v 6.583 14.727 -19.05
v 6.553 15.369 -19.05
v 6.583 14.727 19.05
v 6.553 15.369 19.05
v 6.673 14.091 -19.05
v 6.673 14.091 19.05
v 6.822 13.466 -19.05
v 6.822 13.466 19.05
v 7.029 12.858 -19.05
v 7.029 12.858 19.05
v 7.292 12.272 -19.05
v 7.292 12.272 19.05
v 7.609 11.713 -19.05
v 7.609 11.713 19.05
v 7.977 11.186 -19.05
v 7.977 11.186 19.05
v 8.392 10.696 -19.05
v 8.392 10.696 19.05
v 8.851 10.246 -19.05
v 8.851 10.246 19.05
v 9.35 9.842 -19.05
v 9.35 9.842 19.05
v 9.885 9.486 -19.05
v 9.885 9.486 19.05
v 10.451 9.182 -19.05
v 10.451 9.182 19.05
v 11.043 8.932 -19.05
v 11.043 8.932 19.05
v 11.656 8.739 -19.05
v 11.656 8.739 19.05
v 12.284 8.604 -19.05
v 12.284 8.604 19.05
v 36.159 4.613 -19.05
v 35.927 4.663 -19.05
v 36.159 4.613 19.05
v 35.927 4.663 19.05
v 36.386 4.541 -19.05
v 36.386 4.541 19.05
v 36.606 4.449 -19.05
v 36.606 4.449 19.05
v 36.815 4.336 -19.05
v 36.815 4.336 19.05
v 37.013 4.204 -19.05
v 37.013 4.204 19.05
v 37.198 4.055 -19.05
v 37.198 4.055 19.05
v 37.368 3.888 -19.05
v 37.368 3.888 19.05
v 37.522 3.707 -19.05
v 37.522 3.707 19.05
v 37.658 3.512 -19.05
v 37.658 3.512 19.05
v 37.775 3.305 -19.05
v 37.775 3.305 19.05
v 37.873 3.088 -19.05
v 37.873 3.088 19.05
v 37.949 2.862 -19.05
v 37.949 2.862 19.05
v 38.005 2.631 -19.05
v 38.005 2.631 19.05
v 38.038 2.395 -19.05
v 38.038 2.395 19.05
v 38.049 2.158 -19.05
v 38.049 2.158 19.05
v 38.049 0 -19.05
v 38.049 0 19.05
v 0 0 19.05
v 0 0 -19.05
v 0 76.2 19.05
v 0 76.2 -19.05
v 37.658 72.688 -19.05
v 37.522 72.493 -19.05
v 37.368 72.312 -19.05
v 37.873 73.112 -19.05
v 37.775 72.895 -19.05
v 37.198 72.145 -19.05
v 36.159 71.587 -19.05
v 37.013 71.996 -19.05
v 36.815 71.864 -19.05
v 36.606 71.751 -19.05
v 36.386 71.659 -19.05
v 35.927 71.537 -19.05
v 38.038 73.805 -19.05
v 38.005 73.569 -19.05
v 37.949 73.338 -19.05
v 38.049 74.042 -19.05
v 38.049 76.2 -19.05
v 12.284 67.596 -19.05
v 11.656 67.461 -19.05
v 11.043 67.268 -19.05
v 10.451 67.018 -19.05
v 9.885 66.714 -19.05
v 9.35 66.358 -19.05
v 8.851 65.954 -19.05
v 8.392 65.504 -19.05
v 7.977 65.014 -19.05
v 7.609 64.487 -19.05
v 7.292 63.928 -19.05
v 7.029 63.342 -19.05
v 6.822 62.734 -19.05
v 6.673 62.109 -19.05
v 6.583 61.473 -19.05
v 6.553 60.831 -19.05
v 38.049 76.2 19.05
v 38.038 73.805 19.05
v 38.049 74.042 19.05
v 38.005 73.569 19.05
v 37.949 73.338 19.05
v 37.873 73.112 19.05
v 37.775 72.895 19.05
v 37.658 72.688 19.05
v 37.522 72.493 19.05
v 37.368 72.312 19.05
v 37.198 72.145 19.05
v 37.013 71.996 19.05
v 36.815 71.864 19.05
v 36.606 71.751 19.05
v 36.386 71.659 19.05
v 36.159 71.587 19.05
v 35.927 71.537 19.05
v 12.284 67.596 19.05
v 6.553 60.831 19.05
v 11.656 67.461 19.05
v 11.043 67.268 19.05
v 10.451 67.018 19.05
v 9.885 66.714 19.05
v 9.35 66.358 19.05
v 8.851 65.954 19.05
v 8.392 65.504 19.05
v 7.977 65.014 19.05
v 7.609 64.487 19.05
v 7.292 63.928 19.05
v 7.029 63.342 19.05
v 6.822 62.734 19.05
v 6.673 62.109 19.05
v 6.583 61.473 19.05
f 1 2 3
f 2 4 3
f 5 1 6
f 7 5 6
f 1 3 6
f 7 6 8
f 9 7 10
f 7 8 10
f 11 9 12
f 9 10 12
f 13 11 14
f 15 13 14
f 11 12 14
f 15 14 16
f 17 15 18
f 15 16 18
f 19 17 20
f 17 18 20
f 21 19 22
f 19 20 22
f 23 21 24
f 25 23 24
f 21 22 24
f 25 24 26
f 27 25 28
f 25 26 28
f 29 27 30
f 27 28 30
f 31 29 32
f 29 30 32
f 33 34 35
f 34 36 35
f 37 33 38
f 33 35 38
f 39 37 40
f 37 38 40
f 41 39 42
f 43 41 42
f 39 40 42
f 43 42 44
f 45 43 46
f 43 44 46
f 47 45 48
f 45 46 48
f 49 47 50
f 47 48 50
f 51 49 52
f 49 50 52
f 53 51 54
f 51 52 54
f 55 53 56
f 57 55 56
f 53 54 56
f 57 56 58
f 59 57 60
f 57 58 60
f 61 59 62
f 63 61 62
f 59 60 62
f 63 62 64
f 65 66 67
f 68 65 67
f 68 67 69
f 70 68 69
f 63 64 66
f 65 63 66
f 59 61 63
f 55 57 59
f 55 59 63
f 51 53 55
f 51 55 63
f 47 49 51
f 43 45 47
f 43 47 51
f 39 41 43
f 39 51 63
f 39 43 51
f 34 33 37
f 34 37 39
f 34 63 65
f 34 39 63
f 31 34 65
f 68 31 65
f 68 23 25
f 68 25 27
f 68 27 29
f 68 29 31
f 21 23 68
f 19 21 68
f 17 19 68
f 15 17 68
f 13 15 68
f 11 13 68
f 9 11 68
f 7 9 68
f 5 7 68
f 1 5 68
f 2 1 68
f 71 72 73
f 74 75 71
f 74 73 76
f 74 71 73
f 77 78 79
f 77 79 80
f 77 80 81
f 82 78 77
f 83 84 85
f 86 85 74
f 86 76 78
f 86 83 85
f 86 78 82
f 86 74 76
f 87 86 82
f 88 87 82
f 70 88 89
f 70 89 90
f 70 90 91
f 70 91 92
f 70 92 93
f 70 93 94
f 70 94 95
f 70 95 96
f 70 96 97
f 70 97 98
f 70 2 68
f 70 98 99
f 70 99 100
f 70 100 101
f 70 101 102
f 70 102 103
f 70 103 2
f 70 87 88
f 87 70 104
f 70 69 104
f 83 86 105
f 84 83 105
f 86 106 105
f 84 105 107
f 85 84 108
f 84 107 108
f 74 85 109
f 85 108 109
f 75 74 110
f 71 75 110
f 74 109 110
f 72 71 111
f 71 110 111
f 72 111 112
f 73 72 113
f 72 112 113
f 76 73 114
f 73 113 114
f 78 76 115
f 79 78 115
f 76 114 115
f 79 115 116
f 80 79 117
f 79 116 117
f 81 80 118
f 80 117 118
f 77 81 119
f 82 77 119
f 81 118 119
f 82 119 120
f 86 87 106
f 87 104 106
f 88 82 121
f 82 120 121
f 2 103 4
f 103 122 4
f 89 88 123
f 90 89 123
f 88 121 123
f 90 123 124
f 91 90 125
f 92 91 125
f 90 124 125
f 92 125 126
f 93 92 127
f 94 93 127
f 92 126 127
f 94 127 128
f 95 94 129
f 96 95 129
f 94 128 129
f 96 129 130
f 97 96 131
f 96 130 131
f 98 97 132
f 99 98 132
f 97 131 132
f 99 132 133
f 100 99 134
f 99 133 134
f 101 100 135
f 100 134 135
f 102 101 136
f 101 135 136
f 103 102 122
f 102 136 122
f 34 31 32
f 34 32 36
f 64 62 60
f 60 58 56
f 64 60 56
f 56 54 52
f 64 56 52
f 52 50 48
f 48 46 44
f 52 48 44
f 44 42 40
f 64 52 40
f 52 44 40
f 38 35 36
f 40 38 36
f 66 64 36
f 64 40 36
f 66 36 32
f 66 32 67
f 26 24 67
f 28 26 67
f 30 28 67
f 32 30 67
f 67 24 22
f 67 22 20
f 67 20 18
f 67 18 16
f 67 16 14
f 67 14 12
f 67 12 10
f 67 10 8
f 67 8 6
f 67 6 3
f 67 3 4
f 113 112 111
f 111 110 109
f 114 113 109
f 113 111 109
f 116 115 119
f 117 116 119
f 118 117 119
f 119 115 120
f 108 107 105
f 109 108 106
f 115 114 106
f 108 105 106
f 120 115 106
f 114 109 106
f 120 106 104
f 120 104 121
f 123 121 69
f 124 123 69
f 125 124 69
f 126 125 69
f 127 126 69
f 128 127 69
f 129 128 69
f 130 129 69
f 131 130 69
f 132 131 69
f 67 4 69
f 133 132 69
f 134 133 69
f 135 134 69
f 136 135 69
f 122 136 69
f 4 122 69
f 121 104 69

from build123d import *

# Parameters (mm, degrees)
BOSS_EXTRUDE1_DEPTH = 19.05


with BuildPart() as part:
    # Sketch1 → Boss-Extrude1 (new body, symmetric)
    with BuildSketch(Plane.XY):
        with BuildLine():
            Line((0, 0), (0, 76.2))
            Line((0, 76.2), (38.0492, 76.2))
            Line((38.0492, 76.2), (38.0492, 74.042335136))
            ThreePointArc((38.0492, 74.042335136), (37.447280466, 72.400554363), (35.926803066, 71.536899509))
            Line((35.926803066, 71.536899509), (12.283671721, 67.596090157))
            ThreePointArc((12.283671721, 67.596090157), (8.178382741, 65.264222052), (6.5532, 60.831413966))
            Line((6.5532, 60.831413966), (6.5532, 15.368586034))
            ThreePointArc((6.5532, 15.368586034), (8.178382741, 10.935777948), (12.283671721, 8.603909843))
            Line((12.283671721, 8.603909843), (35.926803066, 4.663100491))
            ThreePointArc((35.926803066, 4.663100491), (37.447280466, 3.799445637), (38.0492, 2.157664864))
            Line((38.0492, 2.157664864), (38.0492, 0))
            Line((38.0492, 0), (0, 0))
        make_face()
    extrude(amount=BOSS_EXTRUDE1_DEPTH, both=True)


solid = part.part
